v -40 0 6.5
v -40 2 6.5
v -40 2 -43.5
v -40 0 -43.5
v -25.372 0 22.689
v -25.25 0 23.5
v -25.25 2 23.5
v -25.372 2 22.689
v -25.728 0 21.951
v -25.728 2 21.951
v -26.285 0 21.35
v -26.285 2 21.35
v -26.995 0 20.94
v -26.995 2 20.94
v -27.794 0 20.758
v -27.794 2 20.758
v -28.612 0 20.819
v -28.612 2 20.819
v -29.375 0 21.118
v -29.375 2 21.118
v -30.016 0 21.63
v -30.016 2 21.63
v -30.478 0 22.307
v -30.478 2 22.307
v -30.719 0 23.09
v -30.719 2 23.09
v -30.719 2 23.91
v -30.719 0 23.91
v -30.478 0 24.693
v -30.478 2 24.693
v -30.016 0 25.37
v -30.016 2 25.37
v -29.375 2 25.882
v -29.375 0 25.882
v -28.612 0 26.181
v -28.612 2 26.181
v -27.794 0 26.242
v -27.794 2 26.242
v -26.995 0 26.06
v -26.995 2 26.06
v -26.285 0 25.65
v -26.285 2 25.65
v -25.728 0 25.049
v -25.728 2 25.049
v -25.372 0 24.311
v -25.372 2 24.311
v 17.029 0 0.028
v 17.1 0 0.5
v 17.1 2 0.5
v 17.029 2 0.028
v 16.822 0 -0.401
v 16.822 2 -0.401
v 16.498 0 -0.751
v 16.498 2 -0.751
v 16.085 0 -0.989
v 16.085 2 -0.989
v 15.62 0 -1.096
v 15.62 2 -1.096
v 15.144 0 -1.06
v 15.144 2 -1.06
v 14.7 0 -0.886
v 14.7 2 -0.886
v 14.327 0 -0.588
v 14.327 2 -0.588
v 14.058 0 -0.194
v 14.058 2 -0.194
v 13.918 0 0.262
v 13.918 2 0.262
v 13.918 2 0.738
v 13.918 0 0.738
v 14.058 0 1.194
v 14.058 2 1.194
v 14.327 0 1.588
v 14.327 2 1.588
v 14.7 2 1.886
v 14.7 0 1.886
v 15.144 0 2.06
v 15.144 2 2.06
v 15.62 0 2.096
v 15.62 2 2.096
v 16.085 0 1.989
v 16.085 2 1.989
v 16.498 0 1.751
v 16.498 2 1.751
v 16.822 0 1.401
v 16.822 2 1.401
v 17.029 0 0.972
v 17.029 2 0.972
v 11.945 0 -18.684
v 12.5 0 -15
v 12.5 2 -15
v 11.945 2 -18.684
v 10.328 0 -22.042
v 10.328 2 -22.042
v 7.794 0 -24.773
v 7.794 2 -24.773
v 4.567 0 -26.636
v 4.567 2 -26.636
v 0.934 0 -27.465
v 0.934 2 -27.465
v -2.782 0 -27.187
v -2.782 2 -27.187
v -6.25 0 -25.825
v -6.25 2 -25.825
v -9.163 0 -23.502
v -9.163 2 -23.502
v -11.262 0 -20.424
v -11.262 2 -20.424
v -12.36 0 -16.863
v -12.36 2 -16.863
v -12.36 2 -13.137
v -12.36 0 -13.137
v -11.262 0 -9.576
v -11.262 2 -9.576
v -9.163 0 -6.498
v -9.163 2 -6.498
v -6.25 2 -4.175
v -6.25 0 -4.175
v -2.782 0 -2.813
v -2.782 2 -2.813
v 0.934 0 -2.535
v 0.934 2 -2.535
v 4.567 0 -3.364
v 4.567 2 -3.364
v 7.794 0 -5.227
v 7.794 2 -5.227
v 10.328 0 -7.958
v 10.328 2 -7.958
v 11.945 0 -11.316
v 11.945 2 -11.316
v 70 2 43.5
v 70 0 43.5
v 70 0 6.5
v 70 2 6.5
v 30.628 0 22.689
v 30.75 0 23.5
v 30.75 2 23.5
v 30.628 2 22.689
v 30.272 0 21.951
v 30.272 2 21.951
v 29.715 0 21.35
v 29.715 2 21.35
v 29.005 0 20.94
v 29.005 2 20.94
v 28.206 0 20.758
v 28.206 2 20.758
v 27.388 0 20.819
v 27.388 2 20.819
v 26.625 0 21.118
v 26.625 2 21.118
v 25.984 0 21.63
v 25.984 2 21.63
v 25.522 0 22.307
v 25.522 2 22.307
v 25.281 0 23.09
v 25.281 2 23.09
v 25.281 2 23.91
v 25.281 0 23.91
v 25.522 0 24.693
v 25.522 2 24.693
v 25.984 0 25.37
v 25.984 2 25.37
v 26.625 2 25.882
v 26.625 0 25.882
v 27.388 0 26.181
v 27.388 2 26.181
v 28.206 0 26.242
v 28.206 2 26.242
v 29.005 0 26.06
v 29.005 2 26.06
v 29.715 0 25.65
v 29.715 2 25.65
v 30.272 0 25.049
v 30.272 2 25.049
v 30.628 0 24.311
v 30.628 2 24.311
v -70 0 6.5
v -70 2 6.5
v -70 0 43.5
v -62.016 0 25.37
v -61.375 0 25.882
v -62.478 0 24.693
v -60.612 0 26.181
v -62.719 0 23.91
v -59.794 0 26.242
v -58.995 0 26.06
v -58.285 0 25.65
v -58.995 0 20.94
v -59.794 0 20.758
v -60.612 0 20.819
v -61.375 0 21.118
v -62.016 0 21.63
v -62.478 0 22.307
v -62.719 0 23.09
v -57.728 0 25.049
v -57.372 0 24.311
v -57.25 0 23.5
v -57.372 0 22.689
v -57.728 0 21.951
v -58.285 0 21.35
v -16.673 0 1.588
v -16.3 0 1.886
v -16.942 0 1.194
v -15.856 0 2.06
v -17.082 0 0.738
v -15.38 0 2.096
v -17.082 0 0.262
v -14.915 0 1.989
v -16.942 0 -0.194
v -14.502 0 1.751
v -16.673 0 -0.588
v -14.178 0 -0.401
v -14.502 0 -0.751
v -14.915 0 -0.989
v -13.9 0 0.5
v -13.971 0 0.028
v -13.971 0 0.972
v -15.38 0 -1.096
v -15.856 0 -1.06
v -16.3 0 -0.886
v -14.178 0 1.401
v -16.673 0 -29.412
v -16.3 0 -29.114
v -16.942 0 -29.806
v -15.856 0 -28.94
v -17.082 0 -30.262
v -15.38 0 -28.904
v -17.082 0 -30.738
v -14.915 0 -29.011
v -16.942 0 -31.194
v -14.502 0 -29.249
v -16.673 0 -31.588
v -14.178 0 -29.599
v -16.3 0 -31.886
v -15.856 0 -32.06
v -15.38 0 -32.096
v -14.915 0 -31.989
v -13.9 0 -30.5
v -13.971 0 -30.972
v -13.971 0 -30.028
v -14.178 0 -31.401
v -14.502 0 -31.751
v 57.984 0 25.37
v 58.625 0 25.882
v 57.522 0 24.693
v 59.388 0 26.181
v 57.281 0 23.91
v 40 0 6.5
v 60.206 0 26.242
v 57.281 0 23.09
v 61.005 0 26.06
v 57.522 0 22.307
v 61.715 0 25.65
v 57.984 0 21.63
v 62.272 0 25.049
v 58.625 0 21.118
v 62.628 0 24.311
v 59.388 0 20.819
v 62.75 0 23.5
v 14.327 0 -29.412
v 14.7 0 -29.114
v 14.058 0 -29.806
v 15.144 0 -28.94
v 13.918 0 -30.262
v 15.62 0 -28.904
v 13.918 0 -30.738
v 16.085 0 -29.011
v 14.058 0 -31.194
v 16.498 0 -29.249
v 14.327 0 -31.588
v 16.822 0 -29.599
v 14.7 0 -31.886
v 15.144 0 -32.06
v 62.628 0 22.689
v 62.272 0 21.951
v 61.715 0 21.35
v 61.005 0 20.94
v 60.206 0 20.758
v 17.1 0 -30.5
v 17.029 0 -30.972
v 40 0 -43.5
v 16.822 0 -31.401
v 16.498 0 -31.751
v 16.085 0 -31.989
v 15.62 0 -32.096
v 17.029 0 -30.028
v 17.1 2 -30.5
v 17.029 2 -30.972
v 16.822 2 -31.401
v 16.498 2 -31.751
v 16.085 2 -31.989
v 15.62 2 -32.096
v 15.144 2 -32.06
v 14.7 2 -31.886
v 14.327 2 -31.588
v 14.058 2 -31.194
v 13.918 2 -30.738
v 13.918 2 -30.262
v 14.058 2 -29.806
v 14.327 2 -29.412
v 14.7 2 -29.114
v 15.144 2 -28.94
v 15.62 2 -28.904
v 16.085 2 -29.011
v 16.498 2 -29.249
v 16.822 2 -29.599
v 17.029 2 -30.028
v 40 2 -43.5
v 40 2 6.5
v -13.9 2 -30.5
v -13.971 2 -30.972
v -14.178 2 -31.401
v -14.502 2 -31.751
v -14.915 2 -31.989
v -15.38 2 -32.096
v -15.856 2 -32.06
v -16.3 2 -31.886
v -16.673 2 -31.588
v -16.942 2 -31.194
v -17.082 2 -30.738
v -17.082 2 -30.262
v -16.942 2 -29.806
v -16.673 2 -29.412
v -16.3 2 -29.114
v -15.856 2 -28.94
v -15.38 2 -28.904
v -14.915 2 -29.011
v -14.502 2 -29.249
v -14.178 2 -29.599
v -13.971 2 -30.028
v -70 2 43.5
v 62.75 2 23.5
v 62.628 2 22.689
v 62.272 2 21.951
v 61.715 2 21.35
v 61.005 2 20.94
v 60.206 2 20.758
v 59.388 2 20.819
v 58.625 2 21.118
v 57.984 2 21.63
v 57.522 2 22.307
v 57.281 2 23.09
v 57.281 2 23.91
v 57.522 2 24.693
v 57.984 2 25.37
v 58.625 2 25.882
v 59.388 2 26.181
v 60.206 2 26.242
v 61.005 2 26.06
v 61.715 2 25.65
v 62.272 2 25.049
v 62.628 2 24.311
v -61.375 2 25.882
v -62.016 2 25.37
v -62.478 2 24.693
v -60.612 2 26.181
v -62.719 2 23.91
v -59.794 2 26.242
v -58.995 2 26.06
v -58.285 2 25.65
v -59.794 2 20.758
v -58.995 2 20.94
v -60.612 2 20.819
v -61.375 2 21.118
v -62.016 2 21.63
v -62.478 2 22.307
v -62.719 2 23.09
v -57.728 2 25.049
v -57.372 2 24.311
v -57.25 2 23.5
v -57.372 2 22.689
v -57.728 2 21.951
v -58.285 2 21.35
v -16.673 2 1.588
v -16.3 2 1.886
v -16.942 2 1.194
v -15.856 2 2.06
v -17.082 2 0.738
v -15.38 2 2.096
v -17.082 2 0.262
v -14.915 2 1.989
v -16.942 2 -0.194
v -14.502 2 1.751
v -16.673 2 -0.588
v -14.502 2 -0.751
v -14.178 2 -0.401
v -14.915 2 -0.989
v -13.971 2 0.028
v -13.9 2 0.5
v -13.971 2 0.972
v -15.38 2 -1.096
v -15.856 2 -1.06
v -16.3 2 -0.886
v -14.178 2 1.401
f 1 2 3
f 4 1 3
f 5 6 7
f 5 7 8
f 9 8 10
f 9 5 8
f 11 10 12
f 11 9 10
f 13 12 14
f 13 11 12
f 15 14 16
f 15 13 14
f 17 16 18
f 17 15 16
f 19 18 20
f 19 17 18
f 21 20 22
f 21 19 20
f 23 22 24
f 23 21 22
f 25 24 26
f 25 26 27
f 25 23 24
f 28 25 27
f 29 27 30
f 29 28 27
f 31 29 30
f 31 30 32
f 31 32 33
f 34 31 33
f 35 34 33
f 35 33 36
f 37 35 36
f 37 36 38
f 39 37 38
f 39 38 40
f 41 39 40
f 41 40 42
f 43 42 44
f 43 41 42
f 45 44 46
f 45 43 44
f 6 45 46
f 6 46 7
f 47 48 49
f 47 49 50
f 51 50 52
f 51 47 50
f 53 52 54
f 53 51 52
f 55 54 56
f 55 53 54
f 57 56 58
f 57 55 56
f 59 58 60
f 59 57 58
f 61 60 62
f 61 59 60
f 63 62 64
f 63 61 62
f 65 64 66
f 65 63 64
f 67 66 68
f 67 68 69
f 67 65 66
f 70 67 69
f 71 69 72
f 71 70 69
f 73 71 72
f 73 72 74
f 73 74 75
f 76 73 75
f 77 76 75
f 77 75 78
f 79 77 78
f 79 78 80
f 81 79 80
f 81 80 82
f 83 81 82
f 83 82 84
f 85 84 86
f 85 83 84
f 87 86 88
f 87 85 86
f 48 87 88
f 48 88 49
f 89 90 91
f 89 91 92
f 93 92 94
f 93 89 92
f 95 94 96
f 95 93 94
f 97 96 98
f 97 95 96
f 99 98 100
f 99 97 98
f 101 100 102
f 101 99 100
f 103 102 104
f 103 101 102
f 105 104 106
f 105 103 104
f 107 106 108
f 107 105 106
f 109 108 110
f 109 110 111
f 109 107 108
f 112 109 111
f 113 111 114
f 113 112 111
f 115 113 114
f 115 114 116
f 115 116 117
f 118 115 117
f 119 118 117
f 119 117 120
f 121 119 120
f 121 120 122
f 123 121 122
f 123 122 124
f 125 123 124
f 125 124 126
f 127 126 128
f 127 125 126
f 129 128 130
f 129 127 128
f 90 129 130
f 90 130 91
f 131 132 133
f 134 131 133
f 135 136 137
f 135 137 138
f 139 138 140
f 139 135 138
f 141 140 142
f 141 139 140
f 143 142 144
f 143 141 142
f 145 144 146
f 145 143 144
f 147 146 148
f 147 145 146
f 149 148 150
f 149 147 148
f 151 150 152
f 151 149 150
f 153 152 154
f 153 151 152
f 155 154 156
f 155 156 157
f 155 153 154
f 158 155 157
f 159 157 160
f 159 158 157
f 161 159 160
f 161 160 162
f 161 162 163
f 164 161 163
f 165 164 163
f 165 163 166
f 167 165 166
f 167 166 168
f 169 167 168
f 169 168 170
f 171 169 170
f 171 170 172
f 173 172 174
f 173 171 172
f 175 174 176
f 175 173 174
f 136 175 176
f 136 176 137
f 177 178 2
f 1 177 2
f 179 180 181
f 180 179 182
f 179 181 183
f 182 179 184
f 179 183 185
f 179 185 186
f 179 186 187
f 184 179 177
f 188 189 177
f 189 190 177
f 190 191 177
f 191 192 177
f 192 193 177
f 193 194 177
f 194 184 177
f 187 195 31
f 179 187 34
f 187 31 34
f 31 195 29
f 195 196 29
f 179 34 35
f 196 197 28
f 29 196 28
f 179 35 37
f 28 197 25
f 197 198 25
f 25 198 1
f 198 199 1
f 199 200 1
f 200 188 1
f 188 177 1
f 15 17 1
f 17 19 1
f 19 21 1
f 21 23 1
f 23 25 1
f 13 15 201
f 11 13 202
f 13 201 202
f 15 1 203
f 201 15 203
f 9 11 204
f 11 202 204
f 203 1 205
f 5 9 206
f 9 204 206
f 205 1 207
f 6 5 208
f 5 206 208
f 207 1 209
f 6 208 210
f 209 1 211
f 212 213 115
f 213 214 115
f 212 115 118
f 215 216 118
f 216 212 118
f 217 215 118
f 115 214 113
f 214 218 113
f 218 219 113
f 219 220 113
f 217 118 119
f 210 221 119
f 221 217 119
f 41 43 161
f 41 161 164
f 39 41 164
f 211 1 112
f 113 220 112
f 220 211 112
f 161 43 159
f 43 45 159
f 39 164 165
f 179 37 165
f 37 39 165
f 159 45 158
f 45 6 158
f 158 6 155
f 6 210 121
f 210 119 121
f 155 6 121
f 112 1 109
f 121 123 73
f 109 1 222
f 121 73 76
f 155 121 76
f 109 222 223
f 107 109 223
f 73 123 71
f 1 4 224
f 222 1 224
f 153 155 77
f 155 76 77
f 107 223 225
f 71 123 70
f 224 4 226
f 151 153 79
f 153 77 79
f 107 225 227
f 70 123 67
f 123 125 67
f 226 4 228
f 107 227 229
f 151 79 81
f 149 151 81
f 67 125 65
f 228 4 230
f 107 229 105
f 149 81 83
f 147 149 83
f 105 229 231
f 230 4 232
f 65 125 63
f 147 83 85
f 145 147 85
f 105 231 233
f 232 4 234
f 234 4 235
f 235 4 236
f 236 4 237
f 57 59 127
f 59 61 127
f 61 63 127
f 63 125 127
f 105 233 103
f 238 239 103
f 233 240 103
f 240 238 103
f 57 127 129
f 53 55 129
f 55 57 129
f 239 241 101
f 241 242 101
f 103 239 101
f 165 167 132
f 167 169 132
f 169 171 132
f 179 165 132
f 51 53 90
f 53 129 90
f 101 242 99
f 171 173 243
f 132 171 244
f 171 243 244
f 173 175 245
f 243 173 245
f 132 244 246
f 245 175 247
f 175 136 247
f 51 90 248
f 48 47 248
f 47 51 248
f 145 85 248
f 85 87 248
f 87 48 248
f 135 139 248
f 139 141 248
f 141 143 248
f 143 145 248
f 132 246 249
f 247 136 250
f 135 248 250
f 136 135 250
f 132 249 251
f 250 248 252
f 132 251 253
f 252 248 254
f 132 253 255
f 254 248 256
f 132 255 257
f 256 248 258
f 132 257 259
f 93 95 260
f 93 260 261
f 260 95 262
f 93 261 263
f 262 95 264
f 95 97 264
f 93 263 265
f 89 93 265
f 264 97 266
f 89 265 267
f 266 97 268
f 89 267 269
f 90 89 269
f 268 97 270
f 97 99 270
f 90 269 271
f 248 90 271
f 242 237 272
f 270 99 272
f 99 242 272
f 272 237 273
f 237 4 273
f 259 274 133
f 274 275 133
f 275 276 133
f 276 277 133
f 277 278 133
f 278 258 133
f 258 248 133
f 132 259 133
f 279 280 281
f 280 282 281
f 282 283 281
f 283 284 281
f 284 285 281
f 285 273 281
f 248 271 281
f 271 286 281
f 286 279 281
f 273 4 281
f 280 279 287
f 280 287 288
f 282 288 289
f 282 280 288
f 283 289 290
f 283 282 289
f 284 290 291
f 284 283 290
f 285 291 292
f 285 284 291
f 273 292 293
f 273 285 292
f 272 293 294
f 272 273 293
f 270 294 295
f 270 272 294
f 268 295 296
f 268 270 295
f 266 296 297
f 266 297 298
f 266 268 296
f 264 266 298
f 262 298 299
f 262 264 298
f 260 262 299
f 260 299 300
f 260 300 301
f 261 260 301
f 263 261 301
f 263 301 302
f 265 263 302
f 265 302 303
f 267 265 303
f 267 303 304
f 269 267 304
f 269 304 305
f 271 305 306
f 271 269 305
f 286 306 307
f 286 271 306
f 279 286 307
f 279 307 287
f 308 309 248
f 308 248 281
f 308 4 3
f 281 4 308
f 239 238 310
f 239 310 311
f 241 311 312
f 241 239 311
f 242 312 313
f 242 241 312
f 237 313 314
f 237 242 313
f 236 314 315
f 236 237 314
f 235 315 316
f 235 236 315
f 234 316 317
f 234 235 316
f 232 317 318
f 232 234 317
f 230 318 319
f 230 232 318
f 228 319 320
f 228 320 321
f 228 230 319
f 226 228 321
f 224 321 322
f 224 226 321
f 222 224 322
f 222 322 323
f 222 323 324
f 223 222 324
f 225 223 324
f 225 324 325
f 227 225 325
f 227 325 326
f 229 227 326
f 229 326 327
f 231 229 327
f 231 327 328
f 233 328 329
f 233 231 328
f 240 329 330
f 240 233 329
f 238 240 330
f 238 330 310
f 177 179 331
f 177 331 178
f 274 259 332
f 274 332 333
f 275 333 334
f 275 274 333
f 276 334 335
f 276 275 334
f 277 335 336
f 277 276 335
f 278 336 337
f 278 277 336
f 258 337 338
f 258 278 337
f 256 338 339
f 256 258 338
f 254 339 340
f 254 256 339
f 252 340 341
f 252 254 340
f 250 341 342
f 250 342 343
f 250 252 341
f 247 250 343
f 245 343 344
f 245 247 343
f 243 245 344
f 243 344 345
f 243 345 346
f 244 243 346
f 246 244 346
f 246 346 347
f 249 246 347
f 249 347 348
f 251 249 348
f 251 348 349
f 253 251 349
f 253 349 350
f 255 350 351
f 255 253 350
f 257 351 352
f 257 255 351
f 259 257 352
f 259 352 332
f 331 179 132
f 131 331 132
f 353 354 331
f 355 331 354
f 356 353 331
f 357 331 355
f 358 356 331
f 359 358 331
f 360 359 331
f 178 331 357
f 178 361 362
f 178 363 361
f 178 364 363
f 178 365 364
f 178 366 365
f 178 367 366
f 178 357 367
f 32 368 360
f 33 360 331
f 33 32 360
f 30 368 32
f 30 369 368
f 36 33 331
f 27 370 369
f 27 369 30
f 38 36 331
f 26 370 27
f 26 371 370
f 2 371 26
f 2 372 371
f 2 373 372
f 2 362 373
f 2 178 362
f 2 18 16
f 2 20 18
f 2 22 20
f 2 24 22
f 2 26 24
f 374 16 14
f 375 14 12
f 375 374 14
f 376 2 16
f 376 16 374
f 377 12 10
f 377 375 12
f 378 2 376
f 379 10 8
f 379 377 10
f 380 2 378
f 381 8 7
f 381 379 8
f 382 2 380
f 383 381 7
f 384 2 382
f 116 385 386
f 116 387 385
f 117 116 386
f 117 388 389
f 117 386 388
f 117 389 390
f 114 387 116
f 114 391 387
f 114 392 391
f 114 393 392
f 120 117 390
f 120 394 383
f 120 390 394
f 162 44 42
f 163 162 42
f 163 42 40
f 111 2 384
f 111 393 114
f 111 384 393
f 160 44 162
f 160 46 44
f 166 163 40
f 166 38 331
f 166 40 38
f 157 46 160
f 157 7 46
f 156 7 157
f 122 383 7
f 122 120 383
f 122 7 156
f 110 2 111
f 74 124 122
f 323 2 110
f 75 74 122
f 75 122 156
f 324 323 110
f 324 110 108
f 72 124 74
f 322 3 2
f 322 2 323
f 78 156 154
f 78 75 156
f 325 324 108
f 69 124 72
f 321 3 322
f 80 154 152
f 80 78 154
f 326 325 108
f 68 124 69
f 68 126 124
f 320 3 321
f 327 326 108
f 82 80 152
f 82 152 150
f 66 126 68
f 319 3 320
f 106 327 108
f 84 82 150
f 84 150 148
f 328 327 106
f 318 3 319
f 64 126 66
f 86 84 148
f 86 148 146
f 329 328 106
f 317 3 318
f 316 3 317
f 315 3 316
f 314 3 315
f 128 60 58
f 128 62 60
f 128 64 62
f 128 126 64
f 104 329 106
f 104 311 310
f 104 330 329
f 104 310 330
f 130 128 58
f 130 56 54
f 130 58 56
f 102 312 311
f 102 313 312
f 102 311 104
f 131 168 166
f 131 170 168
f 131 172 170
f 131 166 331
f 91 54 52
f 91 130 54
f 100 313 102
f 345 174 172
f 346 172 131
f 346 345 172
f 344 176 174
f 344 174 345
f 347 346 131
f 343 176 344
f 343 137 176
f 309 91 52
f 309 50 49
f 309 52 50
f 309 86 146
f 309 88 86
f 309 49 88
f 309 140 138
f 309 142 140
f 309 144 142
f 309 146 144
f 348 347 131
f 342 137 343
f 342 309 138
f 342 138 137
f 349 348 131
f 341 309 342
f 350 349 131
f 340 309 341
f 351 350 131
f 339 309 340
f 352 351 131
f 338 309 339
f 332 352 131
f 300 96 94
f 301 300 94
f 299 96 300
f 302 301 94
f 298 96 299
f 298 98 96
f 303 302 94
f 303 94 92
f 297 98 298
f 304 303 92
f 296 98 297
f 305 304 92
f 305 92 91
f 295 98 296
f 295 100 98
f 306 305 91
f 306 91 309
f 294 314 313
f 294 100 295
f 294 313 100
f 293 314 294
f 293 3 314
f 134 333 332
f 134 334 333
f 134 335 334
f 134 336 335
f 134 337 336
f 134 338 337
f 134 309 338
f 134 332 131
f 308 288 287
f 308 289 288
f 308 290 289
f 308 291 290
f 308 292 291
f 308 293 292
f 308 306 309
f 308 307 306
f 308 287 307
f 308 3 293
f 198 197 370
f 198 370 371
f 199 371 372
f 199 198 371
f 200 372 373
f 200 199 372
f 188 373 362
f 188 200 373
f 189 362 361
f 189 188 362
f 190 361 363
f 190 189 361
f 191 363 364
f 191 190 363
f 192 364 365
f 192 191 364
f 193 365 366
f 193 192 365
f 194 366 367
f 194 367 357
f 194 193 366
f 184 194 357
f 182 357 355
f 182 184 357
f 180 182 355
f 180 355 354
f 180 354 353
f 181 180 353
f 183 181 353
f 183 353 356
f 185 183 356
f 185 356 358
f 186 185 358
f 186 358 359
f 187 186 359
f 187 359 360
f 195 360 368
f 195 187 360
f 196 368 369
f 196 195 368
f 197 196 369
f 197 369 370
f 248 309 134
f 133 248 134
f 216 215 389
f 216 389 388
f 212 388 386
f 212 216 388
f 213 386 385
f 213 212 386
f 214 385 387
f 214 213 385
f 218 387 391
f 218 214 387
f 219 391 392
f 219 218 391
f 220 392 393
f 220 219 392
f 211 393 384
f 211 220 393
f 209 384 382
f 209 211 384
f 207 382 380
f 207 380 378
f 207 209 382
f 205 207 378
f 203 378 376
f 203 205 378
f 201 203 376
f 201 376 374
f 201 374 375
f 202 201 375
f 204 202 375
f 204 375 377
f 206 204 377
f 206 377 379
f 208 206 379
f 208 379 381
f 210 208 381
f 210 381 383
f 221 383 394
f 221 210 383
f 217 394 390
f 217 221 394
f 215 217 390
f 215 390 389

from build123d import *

# Parameters (mm, degrees)
ESQUISSE1_W             = 140
ESQUISSE1_H             = 87
ESQUISSE1_R             = 2.75
ESQUISSE1_R_2           = 1.6
ESQUISSE1_R_3           = 12.5
BOSS_EXTRU_1_DEPTH      = 2
ESQUISSE2_W             = 30
ESQUISSE2_H             = 50
ENL_V_MAT_EXTRU_1_DEPTH = 10


with BuildPart() as part:
    # Esquisse1 → Boss.-Extru.1 (new body)
    with BuildSketch(Plane(origin=(0, 0, 0), x_dir=(1, 0, 0), z_dir=(0, 1, 0))):
        Rectangle(ESQUISSE1_W, ESQUISSE1_H)
        with Locations((-60, -23.5)):
            Circle(ESQUISSE1_R, mode=Mode.SUBTRACT)
        with Locations((-28, -23.5)):
            Circle(ESQUISSE1_R, mode=Mode.SUBTRACT)
        with Locations((28, -23.5)):
            Circle(ESQUISSE1_R, mode=Mode.SUBTRACT)
        with Locations((60, -23.5)):
            Circle(ESQUISSE1_R, mode=Mode.SUBTRACT)
        with Locations((-15.5, 30.5)):
            Circle(ESQUISSE1_R_2, mode=Mode.SUBTRACT)
        with Locations((15.5, 30.5)):
            Circle(ESQUISSE1_R_2, mode=Mode.SUBTRACT)
        with Locations((15.5, -0.5)):
            Circle(ESQUISSE1_R_2, mode=Mode.SUBTRACT)
        with Locations((-15.5, -0.5)):
            Circle(ESQUISSE1_R_2, mode=Mode.SUBTRACT)
        with Locations((0, 15)):
            Circle(ESQUISSE1_R_3, mode=Mode.SUBTRACT)
    extrude(amount=BOSS_EXTRU_1_DEPTH)

    # Esquisse2 → Enlèv. mat.-Extru.1 (cut)
    with BuildSketch(Plane(origin=(0, 2, 0), x_dir=(1, 0, 0), z_dir=(0, 1, 0))):
        with Locations((-55, 18.5)):
            Rectangle(ESQUISSE2_W, ESQUISSE2_H)
        with Locations((55, 18.5)):
            Rectangle(ESQUISSE2_W, ESQUISSE2_H)
    extrude(amount=-ENL_V_MAT_EXTRU_1_DEPTH, mode=Mode.SUBTRACT)


solid = part.part
